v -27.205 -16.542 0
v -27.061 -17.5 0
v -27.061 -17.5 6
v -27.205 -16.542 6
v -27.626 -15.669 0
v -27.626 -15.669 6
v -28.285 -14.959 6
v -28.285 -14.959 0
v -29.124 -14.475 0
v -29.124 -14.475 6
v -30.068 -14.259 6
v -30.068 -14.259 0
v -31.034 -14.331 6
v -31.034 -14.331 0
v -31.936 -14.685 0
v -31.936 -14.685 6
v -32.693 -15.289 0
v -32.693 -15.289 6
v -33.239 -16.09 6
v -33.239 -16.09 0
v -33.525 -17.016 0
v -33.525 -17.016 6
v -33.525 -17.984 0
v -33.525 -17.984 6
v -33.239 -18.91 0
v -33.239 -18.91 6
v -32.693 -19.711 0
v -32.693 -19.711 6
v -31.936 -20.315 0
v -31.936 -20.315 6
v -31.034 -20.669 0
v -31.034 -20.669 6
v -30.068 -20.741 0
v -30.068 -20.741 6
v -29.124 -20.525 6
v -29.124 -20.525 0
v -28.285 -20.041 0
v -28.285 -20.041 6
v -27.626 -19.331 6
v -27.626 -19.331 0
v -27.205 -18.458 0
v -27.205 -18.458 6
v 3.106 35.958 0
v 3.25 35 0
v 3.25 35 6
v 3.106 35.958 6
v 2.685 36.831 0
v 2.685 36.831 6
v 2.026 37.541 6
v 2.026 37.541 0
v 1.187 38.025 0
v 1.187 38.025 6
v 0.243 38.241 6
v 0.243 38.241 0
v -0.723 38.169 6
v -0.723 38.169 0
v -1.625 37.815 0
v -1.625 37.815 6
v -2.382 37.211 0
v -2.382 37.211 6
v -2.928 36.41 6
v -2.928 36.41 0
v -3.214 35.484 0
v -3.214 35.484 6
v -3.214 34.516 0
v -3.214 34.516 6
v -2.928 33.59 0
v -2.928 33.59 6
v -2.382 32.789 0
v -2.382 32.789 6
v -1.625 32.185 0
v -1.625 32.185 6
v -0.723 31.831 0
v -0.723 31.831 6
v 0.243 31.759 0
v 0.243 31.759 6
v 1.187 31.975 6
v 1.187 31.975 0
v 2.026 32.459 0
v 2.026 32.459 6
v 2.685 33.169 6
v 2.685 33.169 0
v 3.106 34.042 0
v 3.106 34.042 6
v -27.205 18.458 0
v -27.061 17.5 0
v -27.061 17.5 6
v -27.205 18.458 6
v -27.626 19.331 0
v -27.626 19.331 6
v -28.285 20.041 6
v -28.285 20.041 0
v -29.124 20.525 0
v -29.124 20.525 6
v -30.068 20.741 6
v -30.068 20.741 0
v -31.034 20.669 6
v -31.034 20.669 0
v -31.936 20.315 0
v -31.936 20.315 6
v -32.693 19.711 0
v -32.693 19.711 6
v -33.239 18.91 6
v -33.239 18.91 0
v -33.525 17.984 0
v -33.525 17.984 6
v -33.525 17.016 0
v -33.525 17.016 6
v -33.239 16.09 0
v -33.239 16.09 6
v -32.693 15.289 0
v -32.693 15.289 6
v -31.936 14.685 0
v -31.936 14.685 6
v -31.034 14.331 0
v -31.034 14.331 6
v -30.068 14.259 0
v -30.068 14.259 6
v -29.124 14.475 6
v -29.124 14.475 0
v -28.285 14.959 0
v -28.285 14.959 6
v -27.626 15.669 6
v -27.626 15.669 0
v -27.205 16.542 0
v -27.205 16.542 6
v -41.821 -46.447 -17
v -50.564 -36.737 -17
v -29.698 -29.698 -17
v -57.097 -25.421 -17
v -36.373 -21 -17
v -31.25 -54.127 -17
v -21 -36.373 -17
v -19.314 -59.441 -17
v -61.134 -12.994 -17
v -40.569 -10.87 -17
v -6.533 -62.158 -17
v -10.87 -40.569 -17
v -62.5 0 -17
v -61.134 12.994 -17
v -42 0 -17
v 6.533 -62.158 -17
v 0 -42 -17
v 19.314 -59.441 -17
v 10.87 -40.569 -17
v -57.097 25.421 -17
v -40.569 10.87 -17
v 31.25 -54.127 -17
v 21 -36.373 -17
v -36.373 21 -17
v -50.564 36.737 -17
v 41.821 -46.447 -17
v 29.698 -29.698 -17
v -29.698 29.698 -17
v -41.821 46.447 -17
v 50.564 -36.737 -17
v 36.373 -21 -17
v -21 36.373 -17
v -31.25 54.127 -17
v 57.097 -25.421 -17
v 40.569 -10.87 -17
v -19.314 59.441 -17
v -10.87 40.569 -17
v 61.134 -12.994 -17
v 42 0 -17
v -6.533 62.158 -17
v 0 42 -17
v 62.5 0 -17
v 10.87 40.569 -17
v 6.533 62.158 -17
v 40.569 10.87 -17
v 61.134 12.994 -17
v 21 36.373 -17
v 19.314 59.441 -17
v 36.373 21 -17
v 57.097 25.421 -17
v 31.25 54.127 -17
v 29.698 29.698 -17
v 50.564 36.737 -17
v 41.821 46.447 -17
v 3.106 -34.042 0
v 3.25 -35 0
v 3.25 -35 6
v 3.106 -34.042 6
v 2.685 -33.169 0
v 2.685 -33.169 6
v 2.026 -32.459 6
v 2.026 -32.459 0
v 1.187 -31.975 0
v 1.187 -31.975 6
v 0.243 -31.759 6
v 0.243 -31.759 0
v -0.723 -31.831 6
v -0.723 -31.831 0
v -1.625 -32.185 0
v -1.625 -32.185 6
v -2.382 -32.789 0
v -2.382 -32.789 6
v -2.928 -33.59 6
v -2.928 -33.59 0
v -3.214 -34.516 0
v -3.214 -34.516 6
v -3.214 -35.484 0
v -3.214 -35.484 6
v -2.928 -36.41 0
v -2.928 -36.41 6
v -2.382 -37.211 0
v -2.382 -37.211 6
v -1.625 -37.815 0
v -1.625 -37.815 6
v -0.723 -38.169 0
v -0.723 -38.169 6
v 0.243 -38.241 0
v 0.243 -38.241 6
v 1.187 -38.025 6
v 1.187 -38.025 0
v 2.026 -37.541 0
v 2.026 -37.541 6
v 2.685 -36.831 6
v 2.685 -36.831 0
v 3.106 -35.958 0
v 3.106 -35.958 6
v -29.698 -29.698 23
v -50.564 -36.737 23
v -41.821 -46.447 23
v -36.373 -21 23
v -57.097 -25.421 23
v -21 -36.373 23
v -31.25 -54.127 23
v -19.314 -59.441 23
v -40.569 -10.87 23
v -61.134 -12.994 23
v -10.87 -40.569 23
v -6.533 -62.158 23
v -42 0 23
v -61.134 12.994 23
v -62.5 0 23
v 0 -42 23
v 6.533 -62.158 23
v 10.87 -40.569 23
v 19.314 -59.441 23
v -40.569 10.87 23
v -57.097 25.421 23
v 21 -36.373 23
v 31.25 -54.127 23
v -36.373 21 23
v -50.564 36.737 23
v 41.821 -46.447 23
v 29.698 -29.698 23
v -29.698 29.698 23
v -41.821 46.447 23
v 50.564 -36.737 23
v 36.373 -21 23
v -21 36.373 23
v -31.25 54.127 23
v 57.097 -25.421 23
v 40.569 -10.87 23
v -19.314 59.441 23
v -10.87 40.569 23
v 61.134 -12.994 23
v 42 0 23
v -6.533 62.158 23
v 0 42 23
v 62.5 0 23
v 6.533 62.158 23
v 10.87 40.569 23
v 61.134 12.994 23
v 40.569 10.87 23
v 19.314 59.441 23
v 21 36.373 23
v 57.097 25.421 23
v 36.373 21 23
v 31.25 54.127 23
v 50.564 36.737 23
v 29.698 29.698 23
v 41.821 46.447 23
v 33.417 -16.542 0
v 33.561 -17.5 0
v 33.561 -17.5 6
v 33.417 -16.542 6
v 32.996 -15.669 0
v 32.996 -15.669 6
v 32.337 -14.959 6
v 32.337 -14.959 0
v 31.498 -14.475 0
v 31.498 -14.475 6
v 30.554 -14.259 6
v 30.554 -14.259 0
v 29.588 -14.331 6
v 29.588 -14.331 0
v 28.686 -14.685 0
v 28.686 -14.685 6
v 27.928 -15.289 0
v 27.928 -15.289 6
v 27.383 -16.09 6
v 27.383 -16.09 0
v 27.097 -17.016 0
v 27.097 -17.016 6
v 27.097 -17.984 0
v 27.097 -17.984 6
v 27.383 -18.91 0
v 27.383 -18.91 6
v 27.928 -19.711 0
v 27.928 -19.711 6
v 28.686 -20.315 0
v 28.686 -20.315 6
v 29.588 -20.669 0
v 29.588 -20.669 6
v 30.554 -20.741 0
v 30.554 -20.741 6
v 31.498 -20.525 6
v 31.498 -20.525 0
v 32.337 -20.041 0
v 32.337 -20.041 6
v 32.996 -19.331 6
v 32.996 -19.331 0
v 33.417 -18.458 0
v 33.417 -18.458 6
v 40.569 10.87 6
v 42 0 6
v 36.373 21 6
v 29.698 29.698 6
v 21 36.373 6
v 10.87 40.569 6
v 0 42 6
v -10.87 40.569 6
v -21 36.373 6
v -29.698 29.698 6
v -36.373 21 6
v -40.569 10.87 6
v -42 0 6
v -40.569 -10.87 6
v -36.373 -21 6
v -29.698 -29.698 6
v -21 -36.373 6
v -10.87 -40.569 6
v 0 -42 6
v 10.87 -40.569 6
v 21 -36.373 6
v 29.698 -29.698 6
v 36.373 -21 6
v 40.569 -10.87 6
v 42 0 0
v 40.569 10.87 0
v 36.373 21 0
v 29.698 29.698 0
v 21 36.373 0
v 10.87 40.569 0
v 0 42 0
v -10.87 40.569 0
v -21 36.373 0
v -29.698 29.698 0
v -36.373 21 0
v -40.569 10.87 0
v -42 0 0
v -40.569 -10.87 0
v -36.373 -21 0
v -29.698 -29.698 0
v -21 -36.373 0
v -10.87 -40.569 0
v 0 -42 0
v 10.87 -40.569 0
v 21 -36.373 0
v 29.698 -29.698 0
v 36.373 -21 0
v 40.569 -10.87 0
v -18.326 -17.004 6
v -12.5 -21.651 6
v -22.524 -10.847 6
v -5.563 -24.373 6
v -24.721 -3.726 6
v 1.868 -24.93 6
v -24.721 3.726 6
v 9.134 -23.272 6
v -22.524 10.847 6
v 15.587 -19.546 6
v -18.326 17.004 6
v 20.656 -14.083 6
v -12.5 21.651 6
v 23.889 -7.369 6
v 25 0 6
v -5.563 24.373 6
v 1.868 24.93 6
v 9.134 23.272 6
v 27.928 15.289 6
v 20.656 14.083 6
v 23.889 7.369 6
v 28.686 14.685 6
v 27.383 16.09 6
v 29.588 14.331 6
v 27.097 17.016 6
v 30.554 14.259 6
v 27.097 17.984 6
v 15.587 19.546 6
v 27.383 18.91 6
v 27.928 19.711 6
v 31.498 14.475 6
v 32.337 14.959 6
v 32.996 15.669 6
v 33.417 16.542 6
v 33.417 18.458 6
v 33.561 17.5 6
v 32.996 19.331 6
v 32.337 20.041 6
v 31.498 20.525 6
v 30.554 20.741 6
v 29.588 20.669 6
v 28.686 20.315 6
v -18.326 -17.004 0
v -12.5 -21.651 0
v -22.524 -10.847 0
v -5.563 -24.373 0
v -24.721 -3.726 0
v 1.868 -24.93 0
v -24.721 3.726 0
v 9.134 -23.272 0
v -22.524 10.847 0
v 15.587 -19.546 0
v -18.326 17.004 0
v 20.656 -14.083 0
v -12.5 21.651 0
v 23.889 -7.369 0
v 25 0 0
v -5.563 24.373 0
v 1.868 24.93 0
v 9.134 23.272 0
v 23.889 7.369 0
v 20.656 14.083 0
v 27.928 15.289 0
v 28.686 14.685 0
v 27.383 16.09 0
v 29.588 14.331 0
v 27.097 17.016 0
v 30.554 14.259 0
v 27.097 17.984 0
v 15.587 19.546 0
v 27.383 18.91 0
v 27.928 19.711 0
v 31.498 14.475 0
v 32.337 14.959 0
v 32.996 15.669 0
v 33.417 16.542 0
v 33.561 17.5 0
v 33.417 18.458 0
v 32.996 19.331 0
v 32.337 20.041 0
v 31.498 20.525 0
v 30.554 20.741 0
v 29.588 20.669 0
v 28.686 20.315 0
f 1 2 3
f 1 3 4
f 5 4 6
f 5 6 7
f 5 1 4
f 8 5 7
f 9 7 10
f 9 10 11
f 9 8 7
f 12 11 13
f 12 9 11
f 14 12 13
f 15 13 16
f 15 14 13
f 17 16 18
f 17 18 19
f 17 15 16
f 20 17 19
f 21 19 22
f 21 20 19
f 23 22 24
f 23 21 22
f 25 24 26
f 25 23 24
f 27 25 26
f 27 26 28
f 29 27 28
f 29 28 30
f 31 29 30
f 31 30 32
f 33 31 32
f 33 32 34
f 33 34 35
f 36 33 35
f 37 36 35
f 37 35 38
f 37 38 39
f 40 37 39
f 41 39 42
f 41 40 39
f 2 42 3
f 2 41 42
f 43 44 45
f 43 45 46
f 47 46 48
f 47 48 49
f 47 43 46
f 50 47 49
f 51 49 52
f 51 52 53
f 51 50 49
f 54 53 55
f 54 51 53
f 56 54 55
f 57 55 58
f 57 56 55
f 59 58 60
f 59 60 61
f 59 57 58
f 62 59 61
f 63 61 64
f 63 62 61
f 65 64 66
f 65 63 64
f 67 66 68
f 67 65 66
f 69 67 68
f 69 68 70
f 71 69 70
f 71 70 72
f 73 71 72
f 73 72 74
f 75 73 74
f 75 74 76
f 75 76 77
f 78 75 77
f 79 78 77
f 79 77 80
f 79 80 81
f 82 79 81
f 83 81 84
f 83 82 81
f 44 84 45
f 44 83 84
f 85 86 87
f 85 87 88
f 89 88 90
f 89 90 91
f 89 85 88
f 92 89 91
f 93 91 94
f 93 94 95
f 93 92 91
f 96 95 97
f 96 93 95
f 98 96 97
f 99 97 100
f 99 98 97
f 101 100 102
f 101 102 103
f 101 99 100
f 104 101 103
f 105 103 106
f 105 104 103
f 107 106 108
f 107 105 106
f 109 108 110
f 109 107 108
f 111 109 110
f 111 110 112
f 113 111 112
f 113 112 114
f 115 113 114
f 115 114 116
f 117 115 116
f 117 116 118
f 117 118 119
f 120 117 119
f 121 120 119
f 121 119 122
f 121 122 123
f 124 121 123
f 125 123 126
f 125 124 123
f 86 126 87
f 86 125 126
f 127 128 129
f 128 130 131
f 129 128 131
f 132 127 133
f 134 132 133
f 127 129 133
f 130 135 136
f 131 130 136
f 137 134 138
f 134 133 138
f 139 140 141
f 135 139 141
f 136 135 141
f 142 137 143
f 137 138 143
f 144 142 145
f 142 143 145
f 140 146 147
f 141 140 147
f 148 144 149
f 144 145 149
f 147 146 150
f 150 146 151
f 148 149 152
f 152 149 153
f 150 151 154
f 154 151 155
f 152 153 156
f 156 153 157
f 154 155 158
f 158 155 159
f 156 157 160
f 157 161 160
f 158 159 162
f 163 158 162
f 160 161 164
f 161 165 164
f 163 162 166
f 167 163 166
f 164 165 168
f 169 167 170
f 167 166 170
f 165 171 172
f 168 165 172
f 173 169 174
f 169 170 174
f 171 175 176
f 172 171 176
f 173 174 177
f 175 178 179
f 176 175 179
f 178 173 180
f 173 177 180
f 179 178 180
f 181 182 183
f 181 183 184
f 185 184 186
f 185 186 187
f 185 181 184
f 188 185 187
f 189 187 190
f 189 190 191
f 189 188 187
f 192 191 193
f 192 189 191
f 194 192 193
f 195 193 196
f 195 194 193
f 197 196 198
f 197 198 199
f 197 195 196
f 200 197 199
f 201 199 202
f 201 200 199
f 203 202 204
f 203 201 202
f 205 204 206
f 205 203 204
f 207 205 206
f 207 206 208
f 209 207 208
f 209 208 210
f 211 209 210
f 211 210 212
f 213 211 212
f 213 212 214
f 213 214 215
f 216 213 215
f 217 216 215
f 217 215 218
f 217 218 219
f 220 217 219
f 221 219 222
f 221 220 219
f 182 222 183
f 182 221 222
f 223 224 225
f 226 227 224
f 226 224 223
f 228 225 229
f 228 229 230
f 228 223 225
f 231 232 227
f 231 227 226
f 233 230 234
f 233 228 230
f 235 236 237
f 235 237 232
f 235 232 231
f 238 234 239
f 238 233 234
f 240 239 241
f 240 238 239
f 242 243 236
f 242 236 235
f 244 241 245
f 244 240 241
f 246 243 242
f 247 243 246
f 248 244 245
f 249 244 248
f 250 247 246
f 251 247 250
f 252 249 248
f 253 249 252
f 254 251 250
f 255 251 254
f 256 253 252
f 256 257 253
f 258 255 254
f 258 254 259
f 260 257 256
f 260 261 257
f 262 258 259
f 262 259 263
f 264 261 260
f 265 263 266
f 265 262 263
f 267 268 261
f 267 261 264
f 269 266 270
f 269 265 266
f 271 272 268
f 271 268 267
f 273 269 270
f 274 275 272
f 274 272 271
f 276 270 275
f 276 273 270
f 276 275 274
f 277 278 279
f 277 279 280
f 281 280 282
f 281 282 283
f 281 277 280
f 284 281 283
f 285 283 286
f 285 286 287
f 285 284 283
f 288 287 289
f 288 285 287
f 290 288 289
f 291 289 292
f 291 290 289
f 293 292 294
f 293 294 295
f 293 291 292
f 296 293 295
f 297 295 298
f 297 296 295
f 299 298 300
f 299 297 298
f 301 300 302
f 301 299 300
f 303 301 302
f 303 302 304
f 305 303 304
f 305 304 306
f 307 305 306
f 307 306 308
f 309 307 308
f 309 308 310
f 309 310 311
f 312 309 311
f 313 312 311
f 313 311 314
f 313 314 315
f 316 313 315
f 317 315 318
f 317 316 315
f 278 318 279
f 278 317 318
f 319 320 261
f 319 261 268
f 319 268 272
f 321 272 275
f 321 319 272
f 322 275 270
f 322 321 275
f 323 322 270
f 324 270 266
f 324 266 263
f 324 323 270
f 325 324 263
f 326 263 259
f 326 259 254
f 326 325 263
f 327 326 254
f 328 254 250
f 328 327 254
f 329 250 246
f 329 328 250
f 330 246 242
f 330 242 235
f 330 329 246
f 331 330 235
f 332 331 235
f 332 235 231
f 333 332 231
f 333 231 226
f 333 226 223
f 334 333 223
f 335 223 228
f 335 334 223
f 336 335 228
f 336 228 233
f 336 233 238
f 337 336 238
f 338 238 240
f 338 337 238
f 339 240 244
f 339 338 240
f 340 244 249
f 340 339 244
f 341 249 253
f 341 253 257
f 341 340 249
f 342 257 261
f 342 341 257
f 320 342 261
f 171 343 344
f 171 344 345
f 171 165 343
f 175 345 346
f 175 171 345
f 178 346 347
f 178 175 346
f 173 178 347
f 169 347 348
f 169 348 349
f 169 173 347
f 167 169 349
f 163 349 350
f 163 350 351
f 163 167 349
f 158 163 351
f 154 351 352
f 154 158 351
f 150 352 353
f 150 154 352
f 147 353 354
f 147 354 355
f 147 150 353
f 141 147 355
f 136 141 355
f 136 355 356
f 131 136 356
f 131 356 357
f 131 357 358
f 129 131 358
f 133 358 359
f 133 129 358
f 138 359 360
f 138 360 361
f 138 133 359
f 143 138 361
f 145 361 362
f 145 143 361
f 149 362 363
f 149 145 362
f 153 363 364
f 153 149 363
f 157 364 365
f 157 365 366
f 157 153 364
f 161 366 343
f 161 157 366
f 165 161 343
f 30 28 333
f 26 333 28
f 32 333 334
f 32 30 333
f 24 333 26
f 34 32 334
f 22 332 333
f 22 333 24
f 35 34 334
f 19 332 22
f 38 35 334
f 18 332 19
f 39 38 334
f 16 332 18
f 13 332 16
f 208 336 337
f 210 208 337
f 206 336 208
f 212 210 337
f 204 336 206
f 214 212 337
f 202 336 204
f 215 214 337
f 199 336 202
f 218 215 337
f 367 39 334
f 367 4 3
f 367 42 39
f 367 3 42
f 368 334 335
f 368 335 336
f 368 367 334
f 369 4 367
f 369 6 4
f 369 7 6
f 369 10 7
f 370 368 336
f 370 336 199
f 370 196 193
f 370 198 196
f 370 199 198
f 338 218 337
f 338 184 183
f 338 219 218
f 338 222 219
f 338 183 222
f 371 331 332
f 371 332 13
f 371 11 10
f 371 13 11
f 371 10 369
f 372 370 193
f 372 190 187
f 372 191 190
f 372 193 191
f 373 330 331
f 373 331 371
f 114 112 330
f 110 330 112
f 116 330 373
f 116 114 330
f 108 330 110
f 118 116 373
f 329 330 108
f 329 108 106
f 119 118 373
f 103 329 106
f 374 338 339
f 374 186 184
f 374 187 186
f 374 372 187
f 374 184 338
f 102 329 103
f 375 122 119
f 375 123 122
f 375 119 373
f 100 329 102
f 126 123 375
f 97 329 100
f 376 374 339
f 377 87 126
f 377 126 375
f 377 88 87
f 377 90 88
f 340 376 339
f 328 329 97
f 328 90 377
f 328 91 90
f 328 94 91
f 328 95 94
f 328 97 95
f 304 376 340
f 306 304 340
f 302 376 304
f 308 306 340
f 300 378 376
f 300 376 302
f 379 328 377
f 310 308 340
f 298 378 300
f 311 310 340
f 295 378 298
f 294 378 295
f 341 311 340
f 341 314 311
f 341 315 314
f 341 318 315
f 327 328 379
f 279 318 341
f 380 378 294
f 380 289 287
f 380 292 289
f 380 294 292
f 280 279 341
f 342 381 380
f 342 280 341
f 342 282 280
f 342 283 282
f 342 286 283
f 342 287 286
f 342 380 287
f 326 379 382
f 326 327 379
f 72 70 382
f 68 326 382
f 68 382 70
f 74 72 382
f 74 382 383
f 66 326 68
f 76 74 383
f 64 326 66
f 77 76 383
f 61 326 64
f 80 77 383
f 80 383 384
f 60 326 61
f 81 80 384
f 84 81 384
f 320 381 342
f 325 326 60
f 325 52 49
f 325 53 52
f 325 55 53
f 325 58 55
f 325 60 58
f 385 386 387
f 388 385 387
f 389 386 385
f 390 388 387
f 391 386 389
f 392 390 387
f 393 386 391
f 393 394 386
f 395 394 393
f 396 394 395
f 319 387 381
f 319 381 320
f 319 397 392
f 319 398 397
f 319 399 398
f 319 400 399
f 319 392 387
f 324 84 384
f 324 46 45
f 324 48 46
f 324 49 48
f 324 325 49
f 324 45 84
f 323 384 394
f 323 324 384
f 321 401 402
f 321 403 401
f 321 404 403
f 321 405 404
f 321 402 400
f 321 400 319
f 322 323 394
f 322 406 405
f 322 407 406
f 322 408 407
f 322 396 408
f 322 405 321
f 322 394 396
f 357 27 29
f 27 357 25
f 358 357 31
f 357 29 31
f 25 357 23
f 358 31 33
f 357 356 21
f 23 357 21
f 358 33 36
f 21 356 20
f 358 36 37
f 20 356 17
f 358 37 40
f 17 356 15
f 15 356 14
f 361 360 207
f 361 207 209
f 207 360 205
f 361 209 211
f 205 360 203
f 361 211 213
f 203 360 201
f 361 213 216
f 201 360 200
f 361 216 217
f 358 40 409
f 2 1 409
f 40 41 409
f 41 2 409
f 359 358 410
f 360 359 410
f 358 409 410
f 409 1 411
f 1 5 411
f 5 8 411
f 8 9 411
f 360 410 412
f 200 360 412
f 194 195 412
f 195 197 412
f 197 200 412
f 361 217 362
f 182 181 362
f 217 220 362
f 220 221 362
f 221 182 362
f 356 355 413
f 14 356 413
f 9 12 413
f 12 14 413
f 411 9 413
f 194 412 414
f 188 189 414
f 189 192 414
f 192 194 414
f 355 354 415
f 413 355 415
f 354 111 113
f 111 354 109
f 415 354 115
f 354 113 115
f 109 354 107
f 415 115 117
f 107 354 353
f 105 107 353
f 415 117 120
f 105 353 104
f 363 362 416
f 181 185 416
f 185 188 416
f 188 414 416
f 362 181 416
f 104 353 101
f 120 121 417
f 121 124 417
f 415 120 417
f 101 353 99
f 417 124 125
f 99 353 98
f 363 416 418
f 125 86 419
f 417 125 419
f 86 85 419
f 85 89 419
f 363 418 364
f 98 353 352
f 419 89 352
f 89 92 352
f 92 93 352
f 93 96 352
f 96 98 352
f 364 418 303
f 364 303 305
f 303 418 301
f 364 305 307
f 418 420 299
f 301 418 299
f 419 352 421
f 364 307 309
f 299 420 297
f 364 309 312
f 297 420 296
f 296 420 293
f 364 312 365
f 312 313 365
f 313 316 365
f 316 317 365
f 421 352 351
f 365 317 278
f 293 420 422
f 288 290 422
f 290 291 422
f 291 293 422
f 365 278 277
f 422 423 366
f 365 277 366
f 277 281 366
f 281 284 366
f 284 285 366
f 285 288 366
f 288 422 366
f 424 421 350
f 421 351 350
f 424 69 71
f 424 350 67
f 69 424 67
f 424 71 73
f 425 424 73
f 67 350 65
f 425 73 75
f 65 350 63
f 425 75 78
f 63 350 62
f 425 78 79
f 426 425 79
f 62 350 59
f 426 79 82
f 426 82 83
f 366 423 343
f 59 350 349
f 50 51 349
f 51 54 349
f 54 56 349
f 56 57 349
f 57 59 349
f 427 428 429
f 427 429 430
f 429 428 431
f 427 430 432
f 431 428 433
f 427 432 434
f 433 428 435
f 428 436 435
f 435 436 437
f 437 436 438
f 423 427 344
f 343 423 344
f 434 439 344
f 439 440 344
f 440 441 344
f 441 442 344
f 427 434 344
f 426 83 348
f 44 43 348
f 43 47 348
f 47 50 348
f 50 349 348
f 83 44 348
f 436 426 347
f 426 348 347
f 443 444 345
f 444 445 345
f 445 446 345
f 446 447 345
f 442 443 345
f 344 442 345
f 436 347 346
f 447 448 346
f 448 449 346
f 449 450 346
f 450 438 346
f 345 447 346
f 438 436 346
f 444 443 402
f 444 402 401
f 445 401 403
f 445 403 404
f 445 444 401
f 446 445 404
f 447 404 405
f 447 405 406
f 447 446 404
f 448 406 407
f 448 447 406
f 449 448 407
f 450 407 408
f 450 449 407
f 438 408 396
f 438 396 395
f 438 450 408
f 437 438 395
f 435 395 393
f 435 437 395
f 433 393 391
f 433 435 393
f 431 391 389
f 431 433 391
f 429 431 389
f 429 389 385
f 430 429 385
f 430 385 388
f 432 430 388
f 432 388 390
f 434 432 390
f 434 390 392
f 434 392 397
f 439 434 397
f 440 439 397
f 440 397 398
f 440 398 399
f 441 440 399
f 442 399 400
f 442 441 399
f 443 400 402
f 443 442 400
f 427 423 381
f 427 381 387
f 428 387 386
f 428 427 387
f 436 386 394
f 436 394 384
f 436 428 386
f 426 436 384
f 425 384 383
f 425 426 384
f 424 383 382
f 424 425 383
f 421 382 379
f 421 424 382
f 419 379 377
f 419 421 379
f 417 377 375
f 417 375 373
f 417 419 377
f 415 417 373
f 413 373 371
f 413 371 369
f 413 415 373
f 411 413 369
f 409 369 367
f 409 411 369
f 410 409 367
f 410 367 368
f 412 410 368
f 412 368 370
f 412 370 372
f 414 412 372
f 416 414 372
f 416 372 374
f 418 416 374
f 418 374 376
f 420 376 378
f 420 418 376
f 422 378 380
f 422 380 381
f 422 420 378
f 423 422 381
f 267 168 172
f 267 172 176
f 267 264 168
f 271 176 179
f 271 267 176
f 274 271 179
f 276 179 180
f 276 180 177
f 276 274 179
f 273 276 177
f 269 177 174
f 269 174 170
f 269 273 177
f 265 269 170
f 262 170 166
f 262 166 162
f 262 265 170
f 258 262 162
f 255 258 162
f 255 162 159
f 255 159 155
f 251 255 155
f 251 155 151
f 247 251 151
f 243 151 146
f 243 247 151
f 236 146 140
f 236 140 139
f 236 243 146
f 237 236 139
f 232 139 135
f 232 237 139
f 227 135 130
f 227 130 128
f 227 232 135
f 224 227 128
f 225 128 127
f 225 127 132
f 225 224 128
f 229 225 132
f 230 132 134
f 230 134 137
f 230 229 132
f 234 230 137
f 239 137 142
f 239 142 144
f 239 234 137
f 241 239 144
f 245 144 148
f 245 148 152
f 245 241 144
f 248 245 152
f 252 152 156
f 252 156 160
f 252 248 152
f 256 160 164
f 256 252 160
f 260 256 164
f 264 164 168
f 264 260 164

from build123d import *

# Parameters (mm, degrees)
SKETCH_1_R      = 42
SKETCH_1_R_2    = 25
SKETCH_1_R_3    = 3.25
EXTRUDE_1_DEPTH = 6
EXTRUDE_START   = -3
SKETCH_2_R      = 62.5
SKETCH_2_R_2    = 42
EXTRUDE_2_DEPTH = 20


with BuildPart() as part:
    # 草图1 → 凸台-拉伸1 (new body)
    with BuildSketch(Plane.XY):
        Circle(SKETCH_1_R)
        Circle(SKETCH_1_R_2, mode=Mode.SUBTRACT)
        with Locations((0, 35)):
            Circle(SKETCH_1_R_3, mode=Mode.SUBTRACT)
        with Locations((30.310889132, 17.5)):
            Circle(SKETCH_1_R_3, mode=Mode.SUBTRACT)
        with Locations((30.310889132, -17.5)):
            Circle(SKETCH_1_R_3, mode=Mode.SUBTRACT)
        with Locations((0, -35)):
            Circle(SKETCH_1_R_3, mode=Mode.SUBTRACT)
        with Locations((-30.310889132, -17.5)):
            Circle(SKETCH_1_R_3, mode=Mode.SUBTRACT)
        with Locations((-30.310889132, 17.5)):
            Circle(SKETCH_1_R_3, mode=Mode.SUBTRACT)
    extrude(amount=EXTRUDE_1_DEPTH)

    # 草图2 → 凸台-拉伸2 (add, symmetric)
    with BuildSketch(Plane.XY.offset(6).offset(EXTRUDE_START)):
        Circle(SKETCH_2_R)
        Circle(SKETCH_2_R_2, mode=Mode.SUBTRACT)
    extrude(amount=EXTRUDE_2_DEPTH, both=True)


solid = part.part
